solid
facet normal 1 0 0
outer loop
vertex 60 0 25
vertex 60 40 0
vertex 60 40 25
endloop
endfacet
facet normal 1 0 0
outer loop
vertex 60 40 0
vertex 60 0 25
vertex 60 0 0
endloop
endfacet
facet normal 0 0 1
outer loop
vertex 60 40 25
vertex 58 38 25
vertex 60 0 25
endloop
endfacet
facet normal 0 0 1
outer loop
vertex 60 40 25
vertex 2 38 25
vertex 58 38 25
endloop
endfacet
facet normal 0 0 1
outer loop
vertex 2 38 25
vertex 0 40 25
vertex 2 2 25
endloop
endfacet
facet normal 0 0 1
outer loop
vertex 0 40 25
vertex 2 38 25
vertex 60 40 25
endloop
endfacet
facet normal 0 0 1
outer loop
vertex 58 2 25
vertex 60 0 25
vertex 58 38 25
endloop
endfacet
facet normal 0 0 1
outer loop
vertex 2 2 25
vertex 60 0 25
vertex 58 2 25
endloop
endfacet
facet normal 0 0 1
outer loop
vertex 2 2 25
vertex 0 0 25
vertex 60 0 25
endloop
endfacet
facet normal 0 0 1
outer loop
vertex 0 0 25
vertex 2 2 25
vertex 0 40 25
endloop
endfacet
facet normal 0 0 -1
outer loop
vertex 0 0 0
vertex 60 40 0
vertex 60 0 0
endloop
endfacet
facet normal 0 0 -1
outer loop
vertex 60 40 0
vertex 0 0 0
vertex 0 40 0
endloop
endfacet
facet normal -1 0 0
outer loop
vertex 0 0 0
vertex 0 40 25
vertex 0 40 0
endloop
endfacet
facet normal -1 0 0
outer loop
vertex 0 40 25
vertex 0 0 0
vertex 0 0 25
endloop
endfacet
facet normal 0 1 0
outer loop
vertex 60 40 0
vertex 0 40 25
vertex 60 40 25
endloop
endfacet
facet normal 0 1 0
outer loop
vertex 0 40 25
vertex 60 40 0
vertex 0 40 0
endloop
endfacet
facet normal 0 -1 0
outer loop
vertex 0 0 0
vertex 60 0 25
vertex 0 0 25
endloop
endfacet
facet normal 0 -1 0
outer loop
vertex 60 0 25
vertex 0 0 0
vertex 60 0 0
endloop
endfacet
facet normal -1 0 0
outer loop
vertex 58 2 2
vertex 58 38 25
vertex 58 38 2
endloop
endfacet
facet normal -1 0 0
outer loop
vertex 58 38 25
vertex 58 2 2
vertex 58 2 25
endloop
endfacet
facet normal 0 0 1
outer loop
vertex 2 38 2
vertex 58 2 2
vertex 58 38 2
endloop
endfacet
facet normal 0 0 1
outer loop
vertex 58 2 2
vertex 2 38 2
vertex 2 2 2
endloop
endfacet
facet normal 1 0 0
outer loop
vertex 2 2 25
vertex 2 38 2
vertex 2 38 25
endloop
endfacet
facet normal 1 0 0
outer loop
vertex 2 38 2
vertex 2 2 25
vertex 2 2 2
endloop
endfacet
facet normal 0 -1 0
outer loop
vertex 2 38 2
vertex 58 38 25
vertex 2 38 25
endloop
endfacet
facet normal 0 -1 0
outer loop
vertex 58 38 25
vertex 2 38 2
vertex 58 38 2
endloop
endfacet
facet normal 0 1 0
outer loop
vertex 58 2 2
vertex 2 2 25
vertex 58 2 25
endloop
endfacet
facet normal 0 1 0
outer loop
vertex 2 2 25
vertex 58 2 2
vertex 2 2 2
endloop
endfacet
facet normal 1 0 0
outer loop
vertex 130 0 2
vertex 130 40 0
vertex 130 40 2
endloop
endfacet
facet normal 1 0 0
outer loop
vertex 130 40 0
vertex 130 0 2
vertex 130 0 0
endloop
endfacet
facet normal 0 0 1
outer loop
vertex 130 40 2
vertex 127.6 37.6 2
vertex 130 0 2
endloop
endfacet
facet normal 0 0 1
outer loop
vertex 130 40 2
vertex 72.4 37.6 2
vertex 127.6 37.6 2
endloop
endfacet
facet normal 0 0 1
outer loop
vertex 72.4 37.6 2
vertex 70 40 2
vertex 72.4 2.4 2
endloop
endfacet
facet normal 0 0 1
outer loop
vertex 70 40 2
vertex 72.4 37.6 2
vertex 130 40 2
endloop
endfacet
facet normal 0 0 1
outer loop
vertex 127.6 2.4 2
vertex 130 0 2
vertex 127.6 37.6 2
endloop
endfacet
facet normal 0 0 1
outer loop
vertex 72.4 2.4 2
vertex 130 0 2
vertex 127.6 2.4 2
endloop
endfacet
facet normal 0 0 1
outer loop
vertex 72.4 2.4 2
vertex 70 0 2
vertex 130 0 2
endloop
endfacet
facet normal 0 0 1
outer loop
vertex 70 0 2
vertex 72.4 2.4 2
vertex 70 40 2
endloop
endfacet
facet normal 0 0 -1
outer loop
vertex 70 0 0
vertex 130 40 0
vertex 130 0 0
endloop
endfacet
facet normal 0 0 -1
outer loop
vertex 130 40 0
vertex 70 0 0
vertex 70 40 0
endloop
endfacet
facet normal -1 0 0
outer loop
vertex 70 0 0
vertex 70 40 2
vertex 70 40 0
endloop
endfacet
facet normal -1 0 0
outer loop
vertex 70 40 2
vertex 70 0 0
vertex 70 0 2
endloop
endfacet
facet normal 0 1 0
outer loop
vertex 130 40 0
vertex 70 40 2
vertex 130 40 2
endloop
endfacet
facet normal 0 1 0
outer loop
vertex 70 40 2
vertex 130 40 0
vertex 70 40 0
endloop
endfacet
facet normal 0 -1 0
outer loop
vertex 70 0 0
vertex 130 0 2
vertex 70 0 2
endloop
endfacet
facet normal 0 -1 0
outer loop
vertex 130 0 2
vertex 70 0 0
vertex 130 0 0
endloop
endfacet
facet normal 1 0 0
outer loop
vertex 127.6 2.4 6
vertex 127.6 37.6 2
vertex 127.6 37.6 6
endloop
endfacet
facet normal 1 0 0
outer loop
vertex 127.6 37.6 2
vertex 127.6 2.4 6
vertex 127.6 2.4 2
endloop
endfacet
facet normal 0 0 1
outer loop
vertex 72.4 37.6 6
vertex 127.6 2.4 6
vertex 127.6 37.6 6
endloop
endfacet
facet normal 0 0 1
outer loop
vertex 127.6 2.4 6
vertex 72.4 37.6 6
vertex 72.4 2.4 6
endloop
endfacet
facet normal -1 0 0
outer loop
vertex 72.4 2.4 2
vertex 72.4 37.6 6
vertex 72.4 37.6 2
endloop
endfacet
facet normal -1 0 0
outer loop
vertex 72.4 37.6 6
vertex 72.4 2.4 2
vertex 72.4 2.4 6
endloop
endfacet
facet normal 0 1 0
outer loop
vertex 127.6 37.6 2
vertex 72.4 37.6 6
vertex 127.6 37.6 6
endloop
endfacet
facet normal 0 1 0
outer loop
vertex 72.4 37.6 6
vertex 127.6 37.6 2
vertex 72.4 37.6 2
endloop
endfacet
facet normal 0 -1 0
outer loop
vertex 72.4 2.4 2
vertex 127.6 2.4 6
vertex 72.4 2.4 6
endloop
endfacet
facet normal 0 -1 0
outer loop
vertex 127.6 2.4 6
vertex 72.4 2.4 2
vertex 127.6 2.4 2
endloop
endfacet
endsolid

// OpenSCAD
// Parametric box with a friction-fit lid
/* [Box] */
// Outer width
width = 60; // [20:1:200]
// Outer depth
depth = 40; // [20:200]
height = 25; // [10:0.5:100]
wall = 2;   // [1:0.1:5]
/* [Lid] */
// Which part to print
part = "both"; // [base, lid, both]
lid_height = 6; // [6:20]

/* [Hidden] */
gap = 0.4;

module shell(w, d, h, t) {
  difference() {
    cube([w, d, h]);
    translate([t, t, t]) cube([w - 2*t, d - 2*t, h]);
  }
}

module lid() {
  inset = wall + gap;
  translate([width + 10, 0, 0]) {
    cube([width, depth, wall]);
    translate([inset, inset, wall])
      cube([width - 2*inset, depth - 2*inset, lid_height - wall]);
  }
}

if (part != "lid") shell(width, depth, height, wall);
if (part != "base") lid();
